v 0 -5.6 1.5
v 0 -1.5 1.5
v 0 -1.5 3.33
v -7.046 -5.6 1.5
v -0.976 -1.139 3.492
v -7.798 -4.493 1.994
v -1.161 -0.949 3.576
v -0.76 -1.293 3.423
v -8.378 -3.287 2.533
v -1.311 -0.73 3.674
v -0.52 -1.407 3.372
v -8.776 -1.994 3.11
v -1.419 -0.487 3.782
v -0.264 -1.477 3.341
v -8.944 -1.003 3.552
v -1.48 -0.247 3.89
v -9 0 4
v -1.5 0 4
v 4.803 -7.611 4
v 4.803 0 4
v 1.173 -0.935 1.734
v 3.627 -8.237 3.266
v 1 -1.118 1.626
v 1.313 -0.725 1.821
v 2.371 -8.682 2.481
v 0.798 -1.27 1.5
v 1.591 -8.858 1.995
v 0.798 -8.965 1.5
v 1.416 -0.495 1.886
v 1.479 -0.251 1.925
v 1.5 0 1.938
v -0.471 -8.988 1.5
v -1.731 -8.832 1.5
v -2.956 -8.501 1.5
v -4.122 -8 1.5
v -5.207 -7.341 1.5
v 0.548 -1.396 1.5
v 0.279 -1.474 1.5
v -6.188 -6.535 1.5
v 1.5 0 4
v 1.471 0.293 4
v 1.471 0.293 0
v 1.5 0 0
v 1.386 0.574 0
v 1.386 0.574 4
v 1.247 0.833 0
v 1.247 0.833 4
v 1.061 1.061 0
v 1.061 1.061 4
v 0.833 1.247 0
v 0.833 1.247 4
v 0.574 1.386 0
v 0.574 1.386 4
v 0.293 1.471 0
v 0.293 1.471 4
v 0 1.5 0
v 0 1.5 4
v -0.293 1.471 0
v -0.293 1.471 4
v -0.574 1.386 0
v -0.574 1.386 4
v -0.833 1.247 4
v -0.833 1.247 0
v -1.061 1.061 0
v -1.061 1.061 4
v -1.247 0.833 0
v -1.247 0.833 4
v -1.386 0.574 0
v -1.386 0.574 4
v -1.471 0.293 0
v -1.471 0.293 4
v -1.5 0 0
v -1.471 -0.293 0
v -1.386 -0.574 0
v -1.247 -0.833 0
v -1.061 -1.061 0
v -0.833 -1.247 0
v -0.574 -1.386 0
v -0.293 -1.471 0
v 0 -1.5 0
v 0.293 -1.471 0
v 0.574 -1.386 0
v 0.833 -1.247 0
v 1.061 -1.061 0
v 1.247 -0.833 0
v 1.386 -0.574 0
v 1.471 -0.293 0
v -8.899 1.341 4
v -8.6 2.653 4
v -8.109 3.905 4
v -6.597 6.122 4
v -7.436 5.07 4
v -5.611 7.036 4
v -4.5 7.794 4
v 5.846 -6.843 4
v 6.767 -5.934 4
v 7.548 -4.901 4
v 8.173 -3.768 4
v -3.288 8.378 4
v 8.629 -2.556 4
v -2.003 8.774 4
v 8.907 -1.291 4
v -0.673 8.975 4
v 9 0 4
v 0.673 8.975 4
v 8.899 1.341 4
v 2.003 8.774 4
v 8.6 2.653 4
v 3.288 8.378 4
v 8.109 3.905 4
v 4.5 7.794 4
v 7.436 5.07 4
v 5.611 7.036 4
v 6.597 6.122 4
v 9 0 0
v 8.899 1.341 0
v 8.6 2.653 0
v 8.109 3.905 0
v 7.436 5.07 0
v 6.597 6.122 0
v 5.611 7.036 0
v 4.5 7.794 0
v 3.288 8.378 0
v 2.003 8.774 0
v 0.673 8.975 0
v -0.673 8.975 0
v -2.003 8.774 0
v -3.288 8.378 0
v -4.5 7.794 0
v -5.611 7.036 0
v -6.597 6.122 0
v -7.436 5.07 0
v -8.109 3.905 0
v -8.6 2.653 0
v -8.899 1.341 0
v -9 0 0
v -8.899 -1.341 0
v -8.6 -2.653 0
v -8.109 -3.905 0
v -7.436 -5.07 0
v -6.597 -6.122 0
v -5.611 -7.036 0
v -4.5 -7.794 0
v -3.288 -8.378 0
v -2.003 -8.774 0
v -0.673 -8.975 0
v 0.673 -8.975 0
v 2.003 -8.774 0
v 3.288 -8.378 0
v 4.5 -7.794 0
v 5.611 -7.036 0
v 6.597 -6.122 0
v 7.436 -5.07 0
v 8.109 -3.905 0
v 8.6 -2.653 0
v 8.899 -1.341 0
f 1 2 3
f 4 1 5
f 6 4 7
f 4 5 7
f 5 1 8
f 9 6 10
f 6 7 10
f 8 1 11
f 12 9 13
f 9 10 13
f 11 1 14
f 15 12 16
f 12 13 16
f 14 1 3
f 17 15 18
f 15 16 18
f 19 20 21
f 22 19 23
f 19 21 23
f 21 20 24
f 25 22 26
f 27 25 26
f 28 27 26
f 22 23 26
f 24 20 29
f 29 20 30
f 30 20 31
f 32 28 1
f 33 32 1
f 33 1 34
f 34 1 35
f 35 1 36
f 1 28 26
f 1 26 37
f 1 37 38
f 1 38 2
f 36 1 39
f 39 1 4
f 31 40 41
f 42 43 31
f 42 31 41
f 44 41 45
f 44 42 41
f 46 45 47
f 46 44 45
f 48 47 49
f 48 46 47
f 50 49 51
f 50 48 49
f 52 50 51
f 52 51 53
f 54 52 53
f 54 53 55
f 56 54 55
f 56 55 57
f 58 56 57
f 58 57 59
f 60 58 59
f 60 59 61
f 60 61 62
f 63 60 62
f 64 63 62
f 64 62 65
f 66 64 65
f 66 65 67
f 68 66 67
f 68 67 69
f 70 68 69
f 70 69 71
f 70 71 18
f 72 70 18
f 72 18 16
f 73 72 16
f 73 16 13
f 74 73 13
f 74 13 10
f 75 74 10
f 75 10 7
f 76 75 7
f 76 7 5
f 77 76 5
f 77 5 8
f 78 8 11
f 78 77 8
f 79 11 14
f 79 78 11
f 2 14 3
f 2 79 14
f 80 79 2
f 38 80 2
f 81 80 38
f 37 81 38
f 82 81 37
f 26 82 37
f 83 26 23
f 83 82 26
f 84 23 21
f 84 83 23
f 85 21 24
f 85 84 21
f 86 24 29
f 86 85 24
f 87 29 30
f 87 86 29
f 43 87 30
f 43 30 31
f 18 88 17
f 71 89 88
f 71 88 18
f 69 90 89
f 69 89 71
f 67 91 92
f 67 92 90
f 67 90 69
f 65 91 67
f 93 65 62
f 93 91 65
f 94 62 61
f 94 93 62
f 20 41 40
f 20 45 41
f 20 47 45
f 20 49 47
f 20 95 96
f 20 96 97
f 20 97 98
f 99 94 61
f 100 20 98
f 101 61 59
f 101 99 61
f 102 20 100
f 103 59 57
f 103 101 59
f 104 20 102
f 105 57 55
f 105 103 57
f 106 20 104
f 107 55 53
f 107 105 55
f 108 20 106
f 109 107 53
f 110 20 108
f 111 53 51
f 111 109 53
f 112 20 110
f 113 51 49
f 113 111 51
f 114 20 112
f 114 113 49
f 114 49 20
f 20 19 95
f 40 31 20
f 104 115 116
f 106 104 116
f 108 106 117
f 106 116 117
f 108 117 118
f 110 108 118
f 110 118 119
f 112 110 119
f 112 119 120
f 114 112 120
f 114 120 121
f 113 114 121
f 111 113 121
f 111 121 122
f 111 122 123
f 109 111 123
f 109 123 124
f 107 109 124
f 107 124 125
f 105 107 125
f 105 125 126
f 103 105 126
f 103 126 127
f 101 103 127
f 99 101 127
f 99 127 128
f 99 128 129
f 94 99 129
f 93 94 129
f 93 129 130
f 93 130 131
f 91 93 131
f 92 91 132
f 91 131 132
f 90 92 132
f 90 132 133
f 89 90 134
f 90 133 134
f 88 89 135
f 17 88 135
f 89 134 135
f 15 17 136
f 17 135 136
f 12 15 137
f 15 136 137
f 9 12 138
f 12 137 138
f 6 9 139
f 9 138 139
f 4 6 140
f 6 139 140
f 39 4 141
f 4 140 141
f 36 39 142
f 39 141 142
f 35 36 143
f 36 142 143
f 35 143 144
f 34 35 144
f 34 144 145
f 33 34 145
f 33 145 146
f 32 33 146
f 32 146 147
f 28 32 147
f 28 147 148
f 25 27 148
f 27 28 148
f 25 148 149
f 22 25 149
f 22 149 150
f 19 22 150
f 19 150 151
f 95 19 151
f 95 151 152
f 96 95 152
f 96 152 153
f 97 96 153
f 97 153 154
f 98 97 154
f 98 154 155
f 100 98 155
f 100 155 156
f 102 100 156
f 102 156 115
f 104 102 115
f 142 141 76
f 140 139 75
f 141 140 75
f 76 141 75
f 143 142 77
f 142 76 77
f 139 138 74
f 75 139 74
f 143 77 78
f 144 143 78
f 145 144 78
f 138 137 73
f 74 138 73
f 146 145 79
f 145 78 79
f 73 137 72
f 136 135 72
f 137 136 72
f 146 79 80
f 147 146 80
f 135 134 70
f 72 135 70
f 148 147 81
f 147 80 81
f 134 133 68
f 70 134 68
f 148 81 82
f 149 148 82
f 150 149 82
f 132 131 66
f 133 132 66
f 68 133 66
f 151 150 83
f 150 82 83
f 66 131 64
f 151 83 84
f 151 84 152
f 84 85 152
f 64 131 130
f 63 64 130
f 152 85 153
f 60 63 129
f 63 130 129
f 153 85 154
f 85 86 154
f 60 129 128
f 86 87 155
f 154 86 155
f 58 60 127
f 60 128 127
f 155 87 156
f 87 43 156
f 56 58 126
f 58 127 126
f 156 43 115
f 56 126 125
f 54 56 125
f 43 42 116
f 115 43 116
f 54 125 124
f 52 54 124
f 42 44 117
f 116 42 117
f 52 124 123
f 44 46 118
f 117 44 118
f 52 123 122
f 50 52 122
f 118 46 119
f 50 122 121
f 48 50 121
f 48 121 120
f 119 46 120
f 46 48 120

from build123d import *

# Parameters (mm, degrees)
CROQUIS1_R              = 9
CROQUIS1_R_2            = 1.5
SALIENTE_EXTRUIR1_DEPTH = 4
CORTAR_EXTRUIR1_DEPTH   = 15
CORTAR_EXTRUIR2_DEPTH   = 10


with BuildPart() as part:
    # Croquis1 → Saliente-Extruir1 (new body)
    with BuildSketch(Plane.XY):
        Circle(CROQUIS1_R)
        Circle(CROQUIS1_R_2, mode=Mode.SUBTRACT)
    extrude(amount=SALIENTE_EXTRUIR1_DEPTH)

    # Croquis2 → Cortar-Extruir1 (cut)
    with BuildSketch(Plane(origin=(0, 0, 0), x_dir=(0, 0, -1), z_dir=(1, 0, 0))):
        Polygon((-1.5, -5.6), (-4, 0), (-4, -9), (-1.5, -9), align=None)
    extrude(amount=-CORTAR_EXTRUIR1_DEPTH, mode=Mode.SUBTRACT)

    # Croquis3 → Cortar-Extruir2 (cut)
    with BuildSketch(Plane(origin=(0, 0, 0), x_dir=(1, 0, 0), z_dir=(0, 1, 0))):
        Polygon((0, -1.5), (0, -4), (4.803477962, -4), (0.798212, -1.5), align=None)
    extrude(amount=-CORTAR_EXTRUIR2_DEPTH, mode=Mode.SUBTRACT)


solid = part.part
